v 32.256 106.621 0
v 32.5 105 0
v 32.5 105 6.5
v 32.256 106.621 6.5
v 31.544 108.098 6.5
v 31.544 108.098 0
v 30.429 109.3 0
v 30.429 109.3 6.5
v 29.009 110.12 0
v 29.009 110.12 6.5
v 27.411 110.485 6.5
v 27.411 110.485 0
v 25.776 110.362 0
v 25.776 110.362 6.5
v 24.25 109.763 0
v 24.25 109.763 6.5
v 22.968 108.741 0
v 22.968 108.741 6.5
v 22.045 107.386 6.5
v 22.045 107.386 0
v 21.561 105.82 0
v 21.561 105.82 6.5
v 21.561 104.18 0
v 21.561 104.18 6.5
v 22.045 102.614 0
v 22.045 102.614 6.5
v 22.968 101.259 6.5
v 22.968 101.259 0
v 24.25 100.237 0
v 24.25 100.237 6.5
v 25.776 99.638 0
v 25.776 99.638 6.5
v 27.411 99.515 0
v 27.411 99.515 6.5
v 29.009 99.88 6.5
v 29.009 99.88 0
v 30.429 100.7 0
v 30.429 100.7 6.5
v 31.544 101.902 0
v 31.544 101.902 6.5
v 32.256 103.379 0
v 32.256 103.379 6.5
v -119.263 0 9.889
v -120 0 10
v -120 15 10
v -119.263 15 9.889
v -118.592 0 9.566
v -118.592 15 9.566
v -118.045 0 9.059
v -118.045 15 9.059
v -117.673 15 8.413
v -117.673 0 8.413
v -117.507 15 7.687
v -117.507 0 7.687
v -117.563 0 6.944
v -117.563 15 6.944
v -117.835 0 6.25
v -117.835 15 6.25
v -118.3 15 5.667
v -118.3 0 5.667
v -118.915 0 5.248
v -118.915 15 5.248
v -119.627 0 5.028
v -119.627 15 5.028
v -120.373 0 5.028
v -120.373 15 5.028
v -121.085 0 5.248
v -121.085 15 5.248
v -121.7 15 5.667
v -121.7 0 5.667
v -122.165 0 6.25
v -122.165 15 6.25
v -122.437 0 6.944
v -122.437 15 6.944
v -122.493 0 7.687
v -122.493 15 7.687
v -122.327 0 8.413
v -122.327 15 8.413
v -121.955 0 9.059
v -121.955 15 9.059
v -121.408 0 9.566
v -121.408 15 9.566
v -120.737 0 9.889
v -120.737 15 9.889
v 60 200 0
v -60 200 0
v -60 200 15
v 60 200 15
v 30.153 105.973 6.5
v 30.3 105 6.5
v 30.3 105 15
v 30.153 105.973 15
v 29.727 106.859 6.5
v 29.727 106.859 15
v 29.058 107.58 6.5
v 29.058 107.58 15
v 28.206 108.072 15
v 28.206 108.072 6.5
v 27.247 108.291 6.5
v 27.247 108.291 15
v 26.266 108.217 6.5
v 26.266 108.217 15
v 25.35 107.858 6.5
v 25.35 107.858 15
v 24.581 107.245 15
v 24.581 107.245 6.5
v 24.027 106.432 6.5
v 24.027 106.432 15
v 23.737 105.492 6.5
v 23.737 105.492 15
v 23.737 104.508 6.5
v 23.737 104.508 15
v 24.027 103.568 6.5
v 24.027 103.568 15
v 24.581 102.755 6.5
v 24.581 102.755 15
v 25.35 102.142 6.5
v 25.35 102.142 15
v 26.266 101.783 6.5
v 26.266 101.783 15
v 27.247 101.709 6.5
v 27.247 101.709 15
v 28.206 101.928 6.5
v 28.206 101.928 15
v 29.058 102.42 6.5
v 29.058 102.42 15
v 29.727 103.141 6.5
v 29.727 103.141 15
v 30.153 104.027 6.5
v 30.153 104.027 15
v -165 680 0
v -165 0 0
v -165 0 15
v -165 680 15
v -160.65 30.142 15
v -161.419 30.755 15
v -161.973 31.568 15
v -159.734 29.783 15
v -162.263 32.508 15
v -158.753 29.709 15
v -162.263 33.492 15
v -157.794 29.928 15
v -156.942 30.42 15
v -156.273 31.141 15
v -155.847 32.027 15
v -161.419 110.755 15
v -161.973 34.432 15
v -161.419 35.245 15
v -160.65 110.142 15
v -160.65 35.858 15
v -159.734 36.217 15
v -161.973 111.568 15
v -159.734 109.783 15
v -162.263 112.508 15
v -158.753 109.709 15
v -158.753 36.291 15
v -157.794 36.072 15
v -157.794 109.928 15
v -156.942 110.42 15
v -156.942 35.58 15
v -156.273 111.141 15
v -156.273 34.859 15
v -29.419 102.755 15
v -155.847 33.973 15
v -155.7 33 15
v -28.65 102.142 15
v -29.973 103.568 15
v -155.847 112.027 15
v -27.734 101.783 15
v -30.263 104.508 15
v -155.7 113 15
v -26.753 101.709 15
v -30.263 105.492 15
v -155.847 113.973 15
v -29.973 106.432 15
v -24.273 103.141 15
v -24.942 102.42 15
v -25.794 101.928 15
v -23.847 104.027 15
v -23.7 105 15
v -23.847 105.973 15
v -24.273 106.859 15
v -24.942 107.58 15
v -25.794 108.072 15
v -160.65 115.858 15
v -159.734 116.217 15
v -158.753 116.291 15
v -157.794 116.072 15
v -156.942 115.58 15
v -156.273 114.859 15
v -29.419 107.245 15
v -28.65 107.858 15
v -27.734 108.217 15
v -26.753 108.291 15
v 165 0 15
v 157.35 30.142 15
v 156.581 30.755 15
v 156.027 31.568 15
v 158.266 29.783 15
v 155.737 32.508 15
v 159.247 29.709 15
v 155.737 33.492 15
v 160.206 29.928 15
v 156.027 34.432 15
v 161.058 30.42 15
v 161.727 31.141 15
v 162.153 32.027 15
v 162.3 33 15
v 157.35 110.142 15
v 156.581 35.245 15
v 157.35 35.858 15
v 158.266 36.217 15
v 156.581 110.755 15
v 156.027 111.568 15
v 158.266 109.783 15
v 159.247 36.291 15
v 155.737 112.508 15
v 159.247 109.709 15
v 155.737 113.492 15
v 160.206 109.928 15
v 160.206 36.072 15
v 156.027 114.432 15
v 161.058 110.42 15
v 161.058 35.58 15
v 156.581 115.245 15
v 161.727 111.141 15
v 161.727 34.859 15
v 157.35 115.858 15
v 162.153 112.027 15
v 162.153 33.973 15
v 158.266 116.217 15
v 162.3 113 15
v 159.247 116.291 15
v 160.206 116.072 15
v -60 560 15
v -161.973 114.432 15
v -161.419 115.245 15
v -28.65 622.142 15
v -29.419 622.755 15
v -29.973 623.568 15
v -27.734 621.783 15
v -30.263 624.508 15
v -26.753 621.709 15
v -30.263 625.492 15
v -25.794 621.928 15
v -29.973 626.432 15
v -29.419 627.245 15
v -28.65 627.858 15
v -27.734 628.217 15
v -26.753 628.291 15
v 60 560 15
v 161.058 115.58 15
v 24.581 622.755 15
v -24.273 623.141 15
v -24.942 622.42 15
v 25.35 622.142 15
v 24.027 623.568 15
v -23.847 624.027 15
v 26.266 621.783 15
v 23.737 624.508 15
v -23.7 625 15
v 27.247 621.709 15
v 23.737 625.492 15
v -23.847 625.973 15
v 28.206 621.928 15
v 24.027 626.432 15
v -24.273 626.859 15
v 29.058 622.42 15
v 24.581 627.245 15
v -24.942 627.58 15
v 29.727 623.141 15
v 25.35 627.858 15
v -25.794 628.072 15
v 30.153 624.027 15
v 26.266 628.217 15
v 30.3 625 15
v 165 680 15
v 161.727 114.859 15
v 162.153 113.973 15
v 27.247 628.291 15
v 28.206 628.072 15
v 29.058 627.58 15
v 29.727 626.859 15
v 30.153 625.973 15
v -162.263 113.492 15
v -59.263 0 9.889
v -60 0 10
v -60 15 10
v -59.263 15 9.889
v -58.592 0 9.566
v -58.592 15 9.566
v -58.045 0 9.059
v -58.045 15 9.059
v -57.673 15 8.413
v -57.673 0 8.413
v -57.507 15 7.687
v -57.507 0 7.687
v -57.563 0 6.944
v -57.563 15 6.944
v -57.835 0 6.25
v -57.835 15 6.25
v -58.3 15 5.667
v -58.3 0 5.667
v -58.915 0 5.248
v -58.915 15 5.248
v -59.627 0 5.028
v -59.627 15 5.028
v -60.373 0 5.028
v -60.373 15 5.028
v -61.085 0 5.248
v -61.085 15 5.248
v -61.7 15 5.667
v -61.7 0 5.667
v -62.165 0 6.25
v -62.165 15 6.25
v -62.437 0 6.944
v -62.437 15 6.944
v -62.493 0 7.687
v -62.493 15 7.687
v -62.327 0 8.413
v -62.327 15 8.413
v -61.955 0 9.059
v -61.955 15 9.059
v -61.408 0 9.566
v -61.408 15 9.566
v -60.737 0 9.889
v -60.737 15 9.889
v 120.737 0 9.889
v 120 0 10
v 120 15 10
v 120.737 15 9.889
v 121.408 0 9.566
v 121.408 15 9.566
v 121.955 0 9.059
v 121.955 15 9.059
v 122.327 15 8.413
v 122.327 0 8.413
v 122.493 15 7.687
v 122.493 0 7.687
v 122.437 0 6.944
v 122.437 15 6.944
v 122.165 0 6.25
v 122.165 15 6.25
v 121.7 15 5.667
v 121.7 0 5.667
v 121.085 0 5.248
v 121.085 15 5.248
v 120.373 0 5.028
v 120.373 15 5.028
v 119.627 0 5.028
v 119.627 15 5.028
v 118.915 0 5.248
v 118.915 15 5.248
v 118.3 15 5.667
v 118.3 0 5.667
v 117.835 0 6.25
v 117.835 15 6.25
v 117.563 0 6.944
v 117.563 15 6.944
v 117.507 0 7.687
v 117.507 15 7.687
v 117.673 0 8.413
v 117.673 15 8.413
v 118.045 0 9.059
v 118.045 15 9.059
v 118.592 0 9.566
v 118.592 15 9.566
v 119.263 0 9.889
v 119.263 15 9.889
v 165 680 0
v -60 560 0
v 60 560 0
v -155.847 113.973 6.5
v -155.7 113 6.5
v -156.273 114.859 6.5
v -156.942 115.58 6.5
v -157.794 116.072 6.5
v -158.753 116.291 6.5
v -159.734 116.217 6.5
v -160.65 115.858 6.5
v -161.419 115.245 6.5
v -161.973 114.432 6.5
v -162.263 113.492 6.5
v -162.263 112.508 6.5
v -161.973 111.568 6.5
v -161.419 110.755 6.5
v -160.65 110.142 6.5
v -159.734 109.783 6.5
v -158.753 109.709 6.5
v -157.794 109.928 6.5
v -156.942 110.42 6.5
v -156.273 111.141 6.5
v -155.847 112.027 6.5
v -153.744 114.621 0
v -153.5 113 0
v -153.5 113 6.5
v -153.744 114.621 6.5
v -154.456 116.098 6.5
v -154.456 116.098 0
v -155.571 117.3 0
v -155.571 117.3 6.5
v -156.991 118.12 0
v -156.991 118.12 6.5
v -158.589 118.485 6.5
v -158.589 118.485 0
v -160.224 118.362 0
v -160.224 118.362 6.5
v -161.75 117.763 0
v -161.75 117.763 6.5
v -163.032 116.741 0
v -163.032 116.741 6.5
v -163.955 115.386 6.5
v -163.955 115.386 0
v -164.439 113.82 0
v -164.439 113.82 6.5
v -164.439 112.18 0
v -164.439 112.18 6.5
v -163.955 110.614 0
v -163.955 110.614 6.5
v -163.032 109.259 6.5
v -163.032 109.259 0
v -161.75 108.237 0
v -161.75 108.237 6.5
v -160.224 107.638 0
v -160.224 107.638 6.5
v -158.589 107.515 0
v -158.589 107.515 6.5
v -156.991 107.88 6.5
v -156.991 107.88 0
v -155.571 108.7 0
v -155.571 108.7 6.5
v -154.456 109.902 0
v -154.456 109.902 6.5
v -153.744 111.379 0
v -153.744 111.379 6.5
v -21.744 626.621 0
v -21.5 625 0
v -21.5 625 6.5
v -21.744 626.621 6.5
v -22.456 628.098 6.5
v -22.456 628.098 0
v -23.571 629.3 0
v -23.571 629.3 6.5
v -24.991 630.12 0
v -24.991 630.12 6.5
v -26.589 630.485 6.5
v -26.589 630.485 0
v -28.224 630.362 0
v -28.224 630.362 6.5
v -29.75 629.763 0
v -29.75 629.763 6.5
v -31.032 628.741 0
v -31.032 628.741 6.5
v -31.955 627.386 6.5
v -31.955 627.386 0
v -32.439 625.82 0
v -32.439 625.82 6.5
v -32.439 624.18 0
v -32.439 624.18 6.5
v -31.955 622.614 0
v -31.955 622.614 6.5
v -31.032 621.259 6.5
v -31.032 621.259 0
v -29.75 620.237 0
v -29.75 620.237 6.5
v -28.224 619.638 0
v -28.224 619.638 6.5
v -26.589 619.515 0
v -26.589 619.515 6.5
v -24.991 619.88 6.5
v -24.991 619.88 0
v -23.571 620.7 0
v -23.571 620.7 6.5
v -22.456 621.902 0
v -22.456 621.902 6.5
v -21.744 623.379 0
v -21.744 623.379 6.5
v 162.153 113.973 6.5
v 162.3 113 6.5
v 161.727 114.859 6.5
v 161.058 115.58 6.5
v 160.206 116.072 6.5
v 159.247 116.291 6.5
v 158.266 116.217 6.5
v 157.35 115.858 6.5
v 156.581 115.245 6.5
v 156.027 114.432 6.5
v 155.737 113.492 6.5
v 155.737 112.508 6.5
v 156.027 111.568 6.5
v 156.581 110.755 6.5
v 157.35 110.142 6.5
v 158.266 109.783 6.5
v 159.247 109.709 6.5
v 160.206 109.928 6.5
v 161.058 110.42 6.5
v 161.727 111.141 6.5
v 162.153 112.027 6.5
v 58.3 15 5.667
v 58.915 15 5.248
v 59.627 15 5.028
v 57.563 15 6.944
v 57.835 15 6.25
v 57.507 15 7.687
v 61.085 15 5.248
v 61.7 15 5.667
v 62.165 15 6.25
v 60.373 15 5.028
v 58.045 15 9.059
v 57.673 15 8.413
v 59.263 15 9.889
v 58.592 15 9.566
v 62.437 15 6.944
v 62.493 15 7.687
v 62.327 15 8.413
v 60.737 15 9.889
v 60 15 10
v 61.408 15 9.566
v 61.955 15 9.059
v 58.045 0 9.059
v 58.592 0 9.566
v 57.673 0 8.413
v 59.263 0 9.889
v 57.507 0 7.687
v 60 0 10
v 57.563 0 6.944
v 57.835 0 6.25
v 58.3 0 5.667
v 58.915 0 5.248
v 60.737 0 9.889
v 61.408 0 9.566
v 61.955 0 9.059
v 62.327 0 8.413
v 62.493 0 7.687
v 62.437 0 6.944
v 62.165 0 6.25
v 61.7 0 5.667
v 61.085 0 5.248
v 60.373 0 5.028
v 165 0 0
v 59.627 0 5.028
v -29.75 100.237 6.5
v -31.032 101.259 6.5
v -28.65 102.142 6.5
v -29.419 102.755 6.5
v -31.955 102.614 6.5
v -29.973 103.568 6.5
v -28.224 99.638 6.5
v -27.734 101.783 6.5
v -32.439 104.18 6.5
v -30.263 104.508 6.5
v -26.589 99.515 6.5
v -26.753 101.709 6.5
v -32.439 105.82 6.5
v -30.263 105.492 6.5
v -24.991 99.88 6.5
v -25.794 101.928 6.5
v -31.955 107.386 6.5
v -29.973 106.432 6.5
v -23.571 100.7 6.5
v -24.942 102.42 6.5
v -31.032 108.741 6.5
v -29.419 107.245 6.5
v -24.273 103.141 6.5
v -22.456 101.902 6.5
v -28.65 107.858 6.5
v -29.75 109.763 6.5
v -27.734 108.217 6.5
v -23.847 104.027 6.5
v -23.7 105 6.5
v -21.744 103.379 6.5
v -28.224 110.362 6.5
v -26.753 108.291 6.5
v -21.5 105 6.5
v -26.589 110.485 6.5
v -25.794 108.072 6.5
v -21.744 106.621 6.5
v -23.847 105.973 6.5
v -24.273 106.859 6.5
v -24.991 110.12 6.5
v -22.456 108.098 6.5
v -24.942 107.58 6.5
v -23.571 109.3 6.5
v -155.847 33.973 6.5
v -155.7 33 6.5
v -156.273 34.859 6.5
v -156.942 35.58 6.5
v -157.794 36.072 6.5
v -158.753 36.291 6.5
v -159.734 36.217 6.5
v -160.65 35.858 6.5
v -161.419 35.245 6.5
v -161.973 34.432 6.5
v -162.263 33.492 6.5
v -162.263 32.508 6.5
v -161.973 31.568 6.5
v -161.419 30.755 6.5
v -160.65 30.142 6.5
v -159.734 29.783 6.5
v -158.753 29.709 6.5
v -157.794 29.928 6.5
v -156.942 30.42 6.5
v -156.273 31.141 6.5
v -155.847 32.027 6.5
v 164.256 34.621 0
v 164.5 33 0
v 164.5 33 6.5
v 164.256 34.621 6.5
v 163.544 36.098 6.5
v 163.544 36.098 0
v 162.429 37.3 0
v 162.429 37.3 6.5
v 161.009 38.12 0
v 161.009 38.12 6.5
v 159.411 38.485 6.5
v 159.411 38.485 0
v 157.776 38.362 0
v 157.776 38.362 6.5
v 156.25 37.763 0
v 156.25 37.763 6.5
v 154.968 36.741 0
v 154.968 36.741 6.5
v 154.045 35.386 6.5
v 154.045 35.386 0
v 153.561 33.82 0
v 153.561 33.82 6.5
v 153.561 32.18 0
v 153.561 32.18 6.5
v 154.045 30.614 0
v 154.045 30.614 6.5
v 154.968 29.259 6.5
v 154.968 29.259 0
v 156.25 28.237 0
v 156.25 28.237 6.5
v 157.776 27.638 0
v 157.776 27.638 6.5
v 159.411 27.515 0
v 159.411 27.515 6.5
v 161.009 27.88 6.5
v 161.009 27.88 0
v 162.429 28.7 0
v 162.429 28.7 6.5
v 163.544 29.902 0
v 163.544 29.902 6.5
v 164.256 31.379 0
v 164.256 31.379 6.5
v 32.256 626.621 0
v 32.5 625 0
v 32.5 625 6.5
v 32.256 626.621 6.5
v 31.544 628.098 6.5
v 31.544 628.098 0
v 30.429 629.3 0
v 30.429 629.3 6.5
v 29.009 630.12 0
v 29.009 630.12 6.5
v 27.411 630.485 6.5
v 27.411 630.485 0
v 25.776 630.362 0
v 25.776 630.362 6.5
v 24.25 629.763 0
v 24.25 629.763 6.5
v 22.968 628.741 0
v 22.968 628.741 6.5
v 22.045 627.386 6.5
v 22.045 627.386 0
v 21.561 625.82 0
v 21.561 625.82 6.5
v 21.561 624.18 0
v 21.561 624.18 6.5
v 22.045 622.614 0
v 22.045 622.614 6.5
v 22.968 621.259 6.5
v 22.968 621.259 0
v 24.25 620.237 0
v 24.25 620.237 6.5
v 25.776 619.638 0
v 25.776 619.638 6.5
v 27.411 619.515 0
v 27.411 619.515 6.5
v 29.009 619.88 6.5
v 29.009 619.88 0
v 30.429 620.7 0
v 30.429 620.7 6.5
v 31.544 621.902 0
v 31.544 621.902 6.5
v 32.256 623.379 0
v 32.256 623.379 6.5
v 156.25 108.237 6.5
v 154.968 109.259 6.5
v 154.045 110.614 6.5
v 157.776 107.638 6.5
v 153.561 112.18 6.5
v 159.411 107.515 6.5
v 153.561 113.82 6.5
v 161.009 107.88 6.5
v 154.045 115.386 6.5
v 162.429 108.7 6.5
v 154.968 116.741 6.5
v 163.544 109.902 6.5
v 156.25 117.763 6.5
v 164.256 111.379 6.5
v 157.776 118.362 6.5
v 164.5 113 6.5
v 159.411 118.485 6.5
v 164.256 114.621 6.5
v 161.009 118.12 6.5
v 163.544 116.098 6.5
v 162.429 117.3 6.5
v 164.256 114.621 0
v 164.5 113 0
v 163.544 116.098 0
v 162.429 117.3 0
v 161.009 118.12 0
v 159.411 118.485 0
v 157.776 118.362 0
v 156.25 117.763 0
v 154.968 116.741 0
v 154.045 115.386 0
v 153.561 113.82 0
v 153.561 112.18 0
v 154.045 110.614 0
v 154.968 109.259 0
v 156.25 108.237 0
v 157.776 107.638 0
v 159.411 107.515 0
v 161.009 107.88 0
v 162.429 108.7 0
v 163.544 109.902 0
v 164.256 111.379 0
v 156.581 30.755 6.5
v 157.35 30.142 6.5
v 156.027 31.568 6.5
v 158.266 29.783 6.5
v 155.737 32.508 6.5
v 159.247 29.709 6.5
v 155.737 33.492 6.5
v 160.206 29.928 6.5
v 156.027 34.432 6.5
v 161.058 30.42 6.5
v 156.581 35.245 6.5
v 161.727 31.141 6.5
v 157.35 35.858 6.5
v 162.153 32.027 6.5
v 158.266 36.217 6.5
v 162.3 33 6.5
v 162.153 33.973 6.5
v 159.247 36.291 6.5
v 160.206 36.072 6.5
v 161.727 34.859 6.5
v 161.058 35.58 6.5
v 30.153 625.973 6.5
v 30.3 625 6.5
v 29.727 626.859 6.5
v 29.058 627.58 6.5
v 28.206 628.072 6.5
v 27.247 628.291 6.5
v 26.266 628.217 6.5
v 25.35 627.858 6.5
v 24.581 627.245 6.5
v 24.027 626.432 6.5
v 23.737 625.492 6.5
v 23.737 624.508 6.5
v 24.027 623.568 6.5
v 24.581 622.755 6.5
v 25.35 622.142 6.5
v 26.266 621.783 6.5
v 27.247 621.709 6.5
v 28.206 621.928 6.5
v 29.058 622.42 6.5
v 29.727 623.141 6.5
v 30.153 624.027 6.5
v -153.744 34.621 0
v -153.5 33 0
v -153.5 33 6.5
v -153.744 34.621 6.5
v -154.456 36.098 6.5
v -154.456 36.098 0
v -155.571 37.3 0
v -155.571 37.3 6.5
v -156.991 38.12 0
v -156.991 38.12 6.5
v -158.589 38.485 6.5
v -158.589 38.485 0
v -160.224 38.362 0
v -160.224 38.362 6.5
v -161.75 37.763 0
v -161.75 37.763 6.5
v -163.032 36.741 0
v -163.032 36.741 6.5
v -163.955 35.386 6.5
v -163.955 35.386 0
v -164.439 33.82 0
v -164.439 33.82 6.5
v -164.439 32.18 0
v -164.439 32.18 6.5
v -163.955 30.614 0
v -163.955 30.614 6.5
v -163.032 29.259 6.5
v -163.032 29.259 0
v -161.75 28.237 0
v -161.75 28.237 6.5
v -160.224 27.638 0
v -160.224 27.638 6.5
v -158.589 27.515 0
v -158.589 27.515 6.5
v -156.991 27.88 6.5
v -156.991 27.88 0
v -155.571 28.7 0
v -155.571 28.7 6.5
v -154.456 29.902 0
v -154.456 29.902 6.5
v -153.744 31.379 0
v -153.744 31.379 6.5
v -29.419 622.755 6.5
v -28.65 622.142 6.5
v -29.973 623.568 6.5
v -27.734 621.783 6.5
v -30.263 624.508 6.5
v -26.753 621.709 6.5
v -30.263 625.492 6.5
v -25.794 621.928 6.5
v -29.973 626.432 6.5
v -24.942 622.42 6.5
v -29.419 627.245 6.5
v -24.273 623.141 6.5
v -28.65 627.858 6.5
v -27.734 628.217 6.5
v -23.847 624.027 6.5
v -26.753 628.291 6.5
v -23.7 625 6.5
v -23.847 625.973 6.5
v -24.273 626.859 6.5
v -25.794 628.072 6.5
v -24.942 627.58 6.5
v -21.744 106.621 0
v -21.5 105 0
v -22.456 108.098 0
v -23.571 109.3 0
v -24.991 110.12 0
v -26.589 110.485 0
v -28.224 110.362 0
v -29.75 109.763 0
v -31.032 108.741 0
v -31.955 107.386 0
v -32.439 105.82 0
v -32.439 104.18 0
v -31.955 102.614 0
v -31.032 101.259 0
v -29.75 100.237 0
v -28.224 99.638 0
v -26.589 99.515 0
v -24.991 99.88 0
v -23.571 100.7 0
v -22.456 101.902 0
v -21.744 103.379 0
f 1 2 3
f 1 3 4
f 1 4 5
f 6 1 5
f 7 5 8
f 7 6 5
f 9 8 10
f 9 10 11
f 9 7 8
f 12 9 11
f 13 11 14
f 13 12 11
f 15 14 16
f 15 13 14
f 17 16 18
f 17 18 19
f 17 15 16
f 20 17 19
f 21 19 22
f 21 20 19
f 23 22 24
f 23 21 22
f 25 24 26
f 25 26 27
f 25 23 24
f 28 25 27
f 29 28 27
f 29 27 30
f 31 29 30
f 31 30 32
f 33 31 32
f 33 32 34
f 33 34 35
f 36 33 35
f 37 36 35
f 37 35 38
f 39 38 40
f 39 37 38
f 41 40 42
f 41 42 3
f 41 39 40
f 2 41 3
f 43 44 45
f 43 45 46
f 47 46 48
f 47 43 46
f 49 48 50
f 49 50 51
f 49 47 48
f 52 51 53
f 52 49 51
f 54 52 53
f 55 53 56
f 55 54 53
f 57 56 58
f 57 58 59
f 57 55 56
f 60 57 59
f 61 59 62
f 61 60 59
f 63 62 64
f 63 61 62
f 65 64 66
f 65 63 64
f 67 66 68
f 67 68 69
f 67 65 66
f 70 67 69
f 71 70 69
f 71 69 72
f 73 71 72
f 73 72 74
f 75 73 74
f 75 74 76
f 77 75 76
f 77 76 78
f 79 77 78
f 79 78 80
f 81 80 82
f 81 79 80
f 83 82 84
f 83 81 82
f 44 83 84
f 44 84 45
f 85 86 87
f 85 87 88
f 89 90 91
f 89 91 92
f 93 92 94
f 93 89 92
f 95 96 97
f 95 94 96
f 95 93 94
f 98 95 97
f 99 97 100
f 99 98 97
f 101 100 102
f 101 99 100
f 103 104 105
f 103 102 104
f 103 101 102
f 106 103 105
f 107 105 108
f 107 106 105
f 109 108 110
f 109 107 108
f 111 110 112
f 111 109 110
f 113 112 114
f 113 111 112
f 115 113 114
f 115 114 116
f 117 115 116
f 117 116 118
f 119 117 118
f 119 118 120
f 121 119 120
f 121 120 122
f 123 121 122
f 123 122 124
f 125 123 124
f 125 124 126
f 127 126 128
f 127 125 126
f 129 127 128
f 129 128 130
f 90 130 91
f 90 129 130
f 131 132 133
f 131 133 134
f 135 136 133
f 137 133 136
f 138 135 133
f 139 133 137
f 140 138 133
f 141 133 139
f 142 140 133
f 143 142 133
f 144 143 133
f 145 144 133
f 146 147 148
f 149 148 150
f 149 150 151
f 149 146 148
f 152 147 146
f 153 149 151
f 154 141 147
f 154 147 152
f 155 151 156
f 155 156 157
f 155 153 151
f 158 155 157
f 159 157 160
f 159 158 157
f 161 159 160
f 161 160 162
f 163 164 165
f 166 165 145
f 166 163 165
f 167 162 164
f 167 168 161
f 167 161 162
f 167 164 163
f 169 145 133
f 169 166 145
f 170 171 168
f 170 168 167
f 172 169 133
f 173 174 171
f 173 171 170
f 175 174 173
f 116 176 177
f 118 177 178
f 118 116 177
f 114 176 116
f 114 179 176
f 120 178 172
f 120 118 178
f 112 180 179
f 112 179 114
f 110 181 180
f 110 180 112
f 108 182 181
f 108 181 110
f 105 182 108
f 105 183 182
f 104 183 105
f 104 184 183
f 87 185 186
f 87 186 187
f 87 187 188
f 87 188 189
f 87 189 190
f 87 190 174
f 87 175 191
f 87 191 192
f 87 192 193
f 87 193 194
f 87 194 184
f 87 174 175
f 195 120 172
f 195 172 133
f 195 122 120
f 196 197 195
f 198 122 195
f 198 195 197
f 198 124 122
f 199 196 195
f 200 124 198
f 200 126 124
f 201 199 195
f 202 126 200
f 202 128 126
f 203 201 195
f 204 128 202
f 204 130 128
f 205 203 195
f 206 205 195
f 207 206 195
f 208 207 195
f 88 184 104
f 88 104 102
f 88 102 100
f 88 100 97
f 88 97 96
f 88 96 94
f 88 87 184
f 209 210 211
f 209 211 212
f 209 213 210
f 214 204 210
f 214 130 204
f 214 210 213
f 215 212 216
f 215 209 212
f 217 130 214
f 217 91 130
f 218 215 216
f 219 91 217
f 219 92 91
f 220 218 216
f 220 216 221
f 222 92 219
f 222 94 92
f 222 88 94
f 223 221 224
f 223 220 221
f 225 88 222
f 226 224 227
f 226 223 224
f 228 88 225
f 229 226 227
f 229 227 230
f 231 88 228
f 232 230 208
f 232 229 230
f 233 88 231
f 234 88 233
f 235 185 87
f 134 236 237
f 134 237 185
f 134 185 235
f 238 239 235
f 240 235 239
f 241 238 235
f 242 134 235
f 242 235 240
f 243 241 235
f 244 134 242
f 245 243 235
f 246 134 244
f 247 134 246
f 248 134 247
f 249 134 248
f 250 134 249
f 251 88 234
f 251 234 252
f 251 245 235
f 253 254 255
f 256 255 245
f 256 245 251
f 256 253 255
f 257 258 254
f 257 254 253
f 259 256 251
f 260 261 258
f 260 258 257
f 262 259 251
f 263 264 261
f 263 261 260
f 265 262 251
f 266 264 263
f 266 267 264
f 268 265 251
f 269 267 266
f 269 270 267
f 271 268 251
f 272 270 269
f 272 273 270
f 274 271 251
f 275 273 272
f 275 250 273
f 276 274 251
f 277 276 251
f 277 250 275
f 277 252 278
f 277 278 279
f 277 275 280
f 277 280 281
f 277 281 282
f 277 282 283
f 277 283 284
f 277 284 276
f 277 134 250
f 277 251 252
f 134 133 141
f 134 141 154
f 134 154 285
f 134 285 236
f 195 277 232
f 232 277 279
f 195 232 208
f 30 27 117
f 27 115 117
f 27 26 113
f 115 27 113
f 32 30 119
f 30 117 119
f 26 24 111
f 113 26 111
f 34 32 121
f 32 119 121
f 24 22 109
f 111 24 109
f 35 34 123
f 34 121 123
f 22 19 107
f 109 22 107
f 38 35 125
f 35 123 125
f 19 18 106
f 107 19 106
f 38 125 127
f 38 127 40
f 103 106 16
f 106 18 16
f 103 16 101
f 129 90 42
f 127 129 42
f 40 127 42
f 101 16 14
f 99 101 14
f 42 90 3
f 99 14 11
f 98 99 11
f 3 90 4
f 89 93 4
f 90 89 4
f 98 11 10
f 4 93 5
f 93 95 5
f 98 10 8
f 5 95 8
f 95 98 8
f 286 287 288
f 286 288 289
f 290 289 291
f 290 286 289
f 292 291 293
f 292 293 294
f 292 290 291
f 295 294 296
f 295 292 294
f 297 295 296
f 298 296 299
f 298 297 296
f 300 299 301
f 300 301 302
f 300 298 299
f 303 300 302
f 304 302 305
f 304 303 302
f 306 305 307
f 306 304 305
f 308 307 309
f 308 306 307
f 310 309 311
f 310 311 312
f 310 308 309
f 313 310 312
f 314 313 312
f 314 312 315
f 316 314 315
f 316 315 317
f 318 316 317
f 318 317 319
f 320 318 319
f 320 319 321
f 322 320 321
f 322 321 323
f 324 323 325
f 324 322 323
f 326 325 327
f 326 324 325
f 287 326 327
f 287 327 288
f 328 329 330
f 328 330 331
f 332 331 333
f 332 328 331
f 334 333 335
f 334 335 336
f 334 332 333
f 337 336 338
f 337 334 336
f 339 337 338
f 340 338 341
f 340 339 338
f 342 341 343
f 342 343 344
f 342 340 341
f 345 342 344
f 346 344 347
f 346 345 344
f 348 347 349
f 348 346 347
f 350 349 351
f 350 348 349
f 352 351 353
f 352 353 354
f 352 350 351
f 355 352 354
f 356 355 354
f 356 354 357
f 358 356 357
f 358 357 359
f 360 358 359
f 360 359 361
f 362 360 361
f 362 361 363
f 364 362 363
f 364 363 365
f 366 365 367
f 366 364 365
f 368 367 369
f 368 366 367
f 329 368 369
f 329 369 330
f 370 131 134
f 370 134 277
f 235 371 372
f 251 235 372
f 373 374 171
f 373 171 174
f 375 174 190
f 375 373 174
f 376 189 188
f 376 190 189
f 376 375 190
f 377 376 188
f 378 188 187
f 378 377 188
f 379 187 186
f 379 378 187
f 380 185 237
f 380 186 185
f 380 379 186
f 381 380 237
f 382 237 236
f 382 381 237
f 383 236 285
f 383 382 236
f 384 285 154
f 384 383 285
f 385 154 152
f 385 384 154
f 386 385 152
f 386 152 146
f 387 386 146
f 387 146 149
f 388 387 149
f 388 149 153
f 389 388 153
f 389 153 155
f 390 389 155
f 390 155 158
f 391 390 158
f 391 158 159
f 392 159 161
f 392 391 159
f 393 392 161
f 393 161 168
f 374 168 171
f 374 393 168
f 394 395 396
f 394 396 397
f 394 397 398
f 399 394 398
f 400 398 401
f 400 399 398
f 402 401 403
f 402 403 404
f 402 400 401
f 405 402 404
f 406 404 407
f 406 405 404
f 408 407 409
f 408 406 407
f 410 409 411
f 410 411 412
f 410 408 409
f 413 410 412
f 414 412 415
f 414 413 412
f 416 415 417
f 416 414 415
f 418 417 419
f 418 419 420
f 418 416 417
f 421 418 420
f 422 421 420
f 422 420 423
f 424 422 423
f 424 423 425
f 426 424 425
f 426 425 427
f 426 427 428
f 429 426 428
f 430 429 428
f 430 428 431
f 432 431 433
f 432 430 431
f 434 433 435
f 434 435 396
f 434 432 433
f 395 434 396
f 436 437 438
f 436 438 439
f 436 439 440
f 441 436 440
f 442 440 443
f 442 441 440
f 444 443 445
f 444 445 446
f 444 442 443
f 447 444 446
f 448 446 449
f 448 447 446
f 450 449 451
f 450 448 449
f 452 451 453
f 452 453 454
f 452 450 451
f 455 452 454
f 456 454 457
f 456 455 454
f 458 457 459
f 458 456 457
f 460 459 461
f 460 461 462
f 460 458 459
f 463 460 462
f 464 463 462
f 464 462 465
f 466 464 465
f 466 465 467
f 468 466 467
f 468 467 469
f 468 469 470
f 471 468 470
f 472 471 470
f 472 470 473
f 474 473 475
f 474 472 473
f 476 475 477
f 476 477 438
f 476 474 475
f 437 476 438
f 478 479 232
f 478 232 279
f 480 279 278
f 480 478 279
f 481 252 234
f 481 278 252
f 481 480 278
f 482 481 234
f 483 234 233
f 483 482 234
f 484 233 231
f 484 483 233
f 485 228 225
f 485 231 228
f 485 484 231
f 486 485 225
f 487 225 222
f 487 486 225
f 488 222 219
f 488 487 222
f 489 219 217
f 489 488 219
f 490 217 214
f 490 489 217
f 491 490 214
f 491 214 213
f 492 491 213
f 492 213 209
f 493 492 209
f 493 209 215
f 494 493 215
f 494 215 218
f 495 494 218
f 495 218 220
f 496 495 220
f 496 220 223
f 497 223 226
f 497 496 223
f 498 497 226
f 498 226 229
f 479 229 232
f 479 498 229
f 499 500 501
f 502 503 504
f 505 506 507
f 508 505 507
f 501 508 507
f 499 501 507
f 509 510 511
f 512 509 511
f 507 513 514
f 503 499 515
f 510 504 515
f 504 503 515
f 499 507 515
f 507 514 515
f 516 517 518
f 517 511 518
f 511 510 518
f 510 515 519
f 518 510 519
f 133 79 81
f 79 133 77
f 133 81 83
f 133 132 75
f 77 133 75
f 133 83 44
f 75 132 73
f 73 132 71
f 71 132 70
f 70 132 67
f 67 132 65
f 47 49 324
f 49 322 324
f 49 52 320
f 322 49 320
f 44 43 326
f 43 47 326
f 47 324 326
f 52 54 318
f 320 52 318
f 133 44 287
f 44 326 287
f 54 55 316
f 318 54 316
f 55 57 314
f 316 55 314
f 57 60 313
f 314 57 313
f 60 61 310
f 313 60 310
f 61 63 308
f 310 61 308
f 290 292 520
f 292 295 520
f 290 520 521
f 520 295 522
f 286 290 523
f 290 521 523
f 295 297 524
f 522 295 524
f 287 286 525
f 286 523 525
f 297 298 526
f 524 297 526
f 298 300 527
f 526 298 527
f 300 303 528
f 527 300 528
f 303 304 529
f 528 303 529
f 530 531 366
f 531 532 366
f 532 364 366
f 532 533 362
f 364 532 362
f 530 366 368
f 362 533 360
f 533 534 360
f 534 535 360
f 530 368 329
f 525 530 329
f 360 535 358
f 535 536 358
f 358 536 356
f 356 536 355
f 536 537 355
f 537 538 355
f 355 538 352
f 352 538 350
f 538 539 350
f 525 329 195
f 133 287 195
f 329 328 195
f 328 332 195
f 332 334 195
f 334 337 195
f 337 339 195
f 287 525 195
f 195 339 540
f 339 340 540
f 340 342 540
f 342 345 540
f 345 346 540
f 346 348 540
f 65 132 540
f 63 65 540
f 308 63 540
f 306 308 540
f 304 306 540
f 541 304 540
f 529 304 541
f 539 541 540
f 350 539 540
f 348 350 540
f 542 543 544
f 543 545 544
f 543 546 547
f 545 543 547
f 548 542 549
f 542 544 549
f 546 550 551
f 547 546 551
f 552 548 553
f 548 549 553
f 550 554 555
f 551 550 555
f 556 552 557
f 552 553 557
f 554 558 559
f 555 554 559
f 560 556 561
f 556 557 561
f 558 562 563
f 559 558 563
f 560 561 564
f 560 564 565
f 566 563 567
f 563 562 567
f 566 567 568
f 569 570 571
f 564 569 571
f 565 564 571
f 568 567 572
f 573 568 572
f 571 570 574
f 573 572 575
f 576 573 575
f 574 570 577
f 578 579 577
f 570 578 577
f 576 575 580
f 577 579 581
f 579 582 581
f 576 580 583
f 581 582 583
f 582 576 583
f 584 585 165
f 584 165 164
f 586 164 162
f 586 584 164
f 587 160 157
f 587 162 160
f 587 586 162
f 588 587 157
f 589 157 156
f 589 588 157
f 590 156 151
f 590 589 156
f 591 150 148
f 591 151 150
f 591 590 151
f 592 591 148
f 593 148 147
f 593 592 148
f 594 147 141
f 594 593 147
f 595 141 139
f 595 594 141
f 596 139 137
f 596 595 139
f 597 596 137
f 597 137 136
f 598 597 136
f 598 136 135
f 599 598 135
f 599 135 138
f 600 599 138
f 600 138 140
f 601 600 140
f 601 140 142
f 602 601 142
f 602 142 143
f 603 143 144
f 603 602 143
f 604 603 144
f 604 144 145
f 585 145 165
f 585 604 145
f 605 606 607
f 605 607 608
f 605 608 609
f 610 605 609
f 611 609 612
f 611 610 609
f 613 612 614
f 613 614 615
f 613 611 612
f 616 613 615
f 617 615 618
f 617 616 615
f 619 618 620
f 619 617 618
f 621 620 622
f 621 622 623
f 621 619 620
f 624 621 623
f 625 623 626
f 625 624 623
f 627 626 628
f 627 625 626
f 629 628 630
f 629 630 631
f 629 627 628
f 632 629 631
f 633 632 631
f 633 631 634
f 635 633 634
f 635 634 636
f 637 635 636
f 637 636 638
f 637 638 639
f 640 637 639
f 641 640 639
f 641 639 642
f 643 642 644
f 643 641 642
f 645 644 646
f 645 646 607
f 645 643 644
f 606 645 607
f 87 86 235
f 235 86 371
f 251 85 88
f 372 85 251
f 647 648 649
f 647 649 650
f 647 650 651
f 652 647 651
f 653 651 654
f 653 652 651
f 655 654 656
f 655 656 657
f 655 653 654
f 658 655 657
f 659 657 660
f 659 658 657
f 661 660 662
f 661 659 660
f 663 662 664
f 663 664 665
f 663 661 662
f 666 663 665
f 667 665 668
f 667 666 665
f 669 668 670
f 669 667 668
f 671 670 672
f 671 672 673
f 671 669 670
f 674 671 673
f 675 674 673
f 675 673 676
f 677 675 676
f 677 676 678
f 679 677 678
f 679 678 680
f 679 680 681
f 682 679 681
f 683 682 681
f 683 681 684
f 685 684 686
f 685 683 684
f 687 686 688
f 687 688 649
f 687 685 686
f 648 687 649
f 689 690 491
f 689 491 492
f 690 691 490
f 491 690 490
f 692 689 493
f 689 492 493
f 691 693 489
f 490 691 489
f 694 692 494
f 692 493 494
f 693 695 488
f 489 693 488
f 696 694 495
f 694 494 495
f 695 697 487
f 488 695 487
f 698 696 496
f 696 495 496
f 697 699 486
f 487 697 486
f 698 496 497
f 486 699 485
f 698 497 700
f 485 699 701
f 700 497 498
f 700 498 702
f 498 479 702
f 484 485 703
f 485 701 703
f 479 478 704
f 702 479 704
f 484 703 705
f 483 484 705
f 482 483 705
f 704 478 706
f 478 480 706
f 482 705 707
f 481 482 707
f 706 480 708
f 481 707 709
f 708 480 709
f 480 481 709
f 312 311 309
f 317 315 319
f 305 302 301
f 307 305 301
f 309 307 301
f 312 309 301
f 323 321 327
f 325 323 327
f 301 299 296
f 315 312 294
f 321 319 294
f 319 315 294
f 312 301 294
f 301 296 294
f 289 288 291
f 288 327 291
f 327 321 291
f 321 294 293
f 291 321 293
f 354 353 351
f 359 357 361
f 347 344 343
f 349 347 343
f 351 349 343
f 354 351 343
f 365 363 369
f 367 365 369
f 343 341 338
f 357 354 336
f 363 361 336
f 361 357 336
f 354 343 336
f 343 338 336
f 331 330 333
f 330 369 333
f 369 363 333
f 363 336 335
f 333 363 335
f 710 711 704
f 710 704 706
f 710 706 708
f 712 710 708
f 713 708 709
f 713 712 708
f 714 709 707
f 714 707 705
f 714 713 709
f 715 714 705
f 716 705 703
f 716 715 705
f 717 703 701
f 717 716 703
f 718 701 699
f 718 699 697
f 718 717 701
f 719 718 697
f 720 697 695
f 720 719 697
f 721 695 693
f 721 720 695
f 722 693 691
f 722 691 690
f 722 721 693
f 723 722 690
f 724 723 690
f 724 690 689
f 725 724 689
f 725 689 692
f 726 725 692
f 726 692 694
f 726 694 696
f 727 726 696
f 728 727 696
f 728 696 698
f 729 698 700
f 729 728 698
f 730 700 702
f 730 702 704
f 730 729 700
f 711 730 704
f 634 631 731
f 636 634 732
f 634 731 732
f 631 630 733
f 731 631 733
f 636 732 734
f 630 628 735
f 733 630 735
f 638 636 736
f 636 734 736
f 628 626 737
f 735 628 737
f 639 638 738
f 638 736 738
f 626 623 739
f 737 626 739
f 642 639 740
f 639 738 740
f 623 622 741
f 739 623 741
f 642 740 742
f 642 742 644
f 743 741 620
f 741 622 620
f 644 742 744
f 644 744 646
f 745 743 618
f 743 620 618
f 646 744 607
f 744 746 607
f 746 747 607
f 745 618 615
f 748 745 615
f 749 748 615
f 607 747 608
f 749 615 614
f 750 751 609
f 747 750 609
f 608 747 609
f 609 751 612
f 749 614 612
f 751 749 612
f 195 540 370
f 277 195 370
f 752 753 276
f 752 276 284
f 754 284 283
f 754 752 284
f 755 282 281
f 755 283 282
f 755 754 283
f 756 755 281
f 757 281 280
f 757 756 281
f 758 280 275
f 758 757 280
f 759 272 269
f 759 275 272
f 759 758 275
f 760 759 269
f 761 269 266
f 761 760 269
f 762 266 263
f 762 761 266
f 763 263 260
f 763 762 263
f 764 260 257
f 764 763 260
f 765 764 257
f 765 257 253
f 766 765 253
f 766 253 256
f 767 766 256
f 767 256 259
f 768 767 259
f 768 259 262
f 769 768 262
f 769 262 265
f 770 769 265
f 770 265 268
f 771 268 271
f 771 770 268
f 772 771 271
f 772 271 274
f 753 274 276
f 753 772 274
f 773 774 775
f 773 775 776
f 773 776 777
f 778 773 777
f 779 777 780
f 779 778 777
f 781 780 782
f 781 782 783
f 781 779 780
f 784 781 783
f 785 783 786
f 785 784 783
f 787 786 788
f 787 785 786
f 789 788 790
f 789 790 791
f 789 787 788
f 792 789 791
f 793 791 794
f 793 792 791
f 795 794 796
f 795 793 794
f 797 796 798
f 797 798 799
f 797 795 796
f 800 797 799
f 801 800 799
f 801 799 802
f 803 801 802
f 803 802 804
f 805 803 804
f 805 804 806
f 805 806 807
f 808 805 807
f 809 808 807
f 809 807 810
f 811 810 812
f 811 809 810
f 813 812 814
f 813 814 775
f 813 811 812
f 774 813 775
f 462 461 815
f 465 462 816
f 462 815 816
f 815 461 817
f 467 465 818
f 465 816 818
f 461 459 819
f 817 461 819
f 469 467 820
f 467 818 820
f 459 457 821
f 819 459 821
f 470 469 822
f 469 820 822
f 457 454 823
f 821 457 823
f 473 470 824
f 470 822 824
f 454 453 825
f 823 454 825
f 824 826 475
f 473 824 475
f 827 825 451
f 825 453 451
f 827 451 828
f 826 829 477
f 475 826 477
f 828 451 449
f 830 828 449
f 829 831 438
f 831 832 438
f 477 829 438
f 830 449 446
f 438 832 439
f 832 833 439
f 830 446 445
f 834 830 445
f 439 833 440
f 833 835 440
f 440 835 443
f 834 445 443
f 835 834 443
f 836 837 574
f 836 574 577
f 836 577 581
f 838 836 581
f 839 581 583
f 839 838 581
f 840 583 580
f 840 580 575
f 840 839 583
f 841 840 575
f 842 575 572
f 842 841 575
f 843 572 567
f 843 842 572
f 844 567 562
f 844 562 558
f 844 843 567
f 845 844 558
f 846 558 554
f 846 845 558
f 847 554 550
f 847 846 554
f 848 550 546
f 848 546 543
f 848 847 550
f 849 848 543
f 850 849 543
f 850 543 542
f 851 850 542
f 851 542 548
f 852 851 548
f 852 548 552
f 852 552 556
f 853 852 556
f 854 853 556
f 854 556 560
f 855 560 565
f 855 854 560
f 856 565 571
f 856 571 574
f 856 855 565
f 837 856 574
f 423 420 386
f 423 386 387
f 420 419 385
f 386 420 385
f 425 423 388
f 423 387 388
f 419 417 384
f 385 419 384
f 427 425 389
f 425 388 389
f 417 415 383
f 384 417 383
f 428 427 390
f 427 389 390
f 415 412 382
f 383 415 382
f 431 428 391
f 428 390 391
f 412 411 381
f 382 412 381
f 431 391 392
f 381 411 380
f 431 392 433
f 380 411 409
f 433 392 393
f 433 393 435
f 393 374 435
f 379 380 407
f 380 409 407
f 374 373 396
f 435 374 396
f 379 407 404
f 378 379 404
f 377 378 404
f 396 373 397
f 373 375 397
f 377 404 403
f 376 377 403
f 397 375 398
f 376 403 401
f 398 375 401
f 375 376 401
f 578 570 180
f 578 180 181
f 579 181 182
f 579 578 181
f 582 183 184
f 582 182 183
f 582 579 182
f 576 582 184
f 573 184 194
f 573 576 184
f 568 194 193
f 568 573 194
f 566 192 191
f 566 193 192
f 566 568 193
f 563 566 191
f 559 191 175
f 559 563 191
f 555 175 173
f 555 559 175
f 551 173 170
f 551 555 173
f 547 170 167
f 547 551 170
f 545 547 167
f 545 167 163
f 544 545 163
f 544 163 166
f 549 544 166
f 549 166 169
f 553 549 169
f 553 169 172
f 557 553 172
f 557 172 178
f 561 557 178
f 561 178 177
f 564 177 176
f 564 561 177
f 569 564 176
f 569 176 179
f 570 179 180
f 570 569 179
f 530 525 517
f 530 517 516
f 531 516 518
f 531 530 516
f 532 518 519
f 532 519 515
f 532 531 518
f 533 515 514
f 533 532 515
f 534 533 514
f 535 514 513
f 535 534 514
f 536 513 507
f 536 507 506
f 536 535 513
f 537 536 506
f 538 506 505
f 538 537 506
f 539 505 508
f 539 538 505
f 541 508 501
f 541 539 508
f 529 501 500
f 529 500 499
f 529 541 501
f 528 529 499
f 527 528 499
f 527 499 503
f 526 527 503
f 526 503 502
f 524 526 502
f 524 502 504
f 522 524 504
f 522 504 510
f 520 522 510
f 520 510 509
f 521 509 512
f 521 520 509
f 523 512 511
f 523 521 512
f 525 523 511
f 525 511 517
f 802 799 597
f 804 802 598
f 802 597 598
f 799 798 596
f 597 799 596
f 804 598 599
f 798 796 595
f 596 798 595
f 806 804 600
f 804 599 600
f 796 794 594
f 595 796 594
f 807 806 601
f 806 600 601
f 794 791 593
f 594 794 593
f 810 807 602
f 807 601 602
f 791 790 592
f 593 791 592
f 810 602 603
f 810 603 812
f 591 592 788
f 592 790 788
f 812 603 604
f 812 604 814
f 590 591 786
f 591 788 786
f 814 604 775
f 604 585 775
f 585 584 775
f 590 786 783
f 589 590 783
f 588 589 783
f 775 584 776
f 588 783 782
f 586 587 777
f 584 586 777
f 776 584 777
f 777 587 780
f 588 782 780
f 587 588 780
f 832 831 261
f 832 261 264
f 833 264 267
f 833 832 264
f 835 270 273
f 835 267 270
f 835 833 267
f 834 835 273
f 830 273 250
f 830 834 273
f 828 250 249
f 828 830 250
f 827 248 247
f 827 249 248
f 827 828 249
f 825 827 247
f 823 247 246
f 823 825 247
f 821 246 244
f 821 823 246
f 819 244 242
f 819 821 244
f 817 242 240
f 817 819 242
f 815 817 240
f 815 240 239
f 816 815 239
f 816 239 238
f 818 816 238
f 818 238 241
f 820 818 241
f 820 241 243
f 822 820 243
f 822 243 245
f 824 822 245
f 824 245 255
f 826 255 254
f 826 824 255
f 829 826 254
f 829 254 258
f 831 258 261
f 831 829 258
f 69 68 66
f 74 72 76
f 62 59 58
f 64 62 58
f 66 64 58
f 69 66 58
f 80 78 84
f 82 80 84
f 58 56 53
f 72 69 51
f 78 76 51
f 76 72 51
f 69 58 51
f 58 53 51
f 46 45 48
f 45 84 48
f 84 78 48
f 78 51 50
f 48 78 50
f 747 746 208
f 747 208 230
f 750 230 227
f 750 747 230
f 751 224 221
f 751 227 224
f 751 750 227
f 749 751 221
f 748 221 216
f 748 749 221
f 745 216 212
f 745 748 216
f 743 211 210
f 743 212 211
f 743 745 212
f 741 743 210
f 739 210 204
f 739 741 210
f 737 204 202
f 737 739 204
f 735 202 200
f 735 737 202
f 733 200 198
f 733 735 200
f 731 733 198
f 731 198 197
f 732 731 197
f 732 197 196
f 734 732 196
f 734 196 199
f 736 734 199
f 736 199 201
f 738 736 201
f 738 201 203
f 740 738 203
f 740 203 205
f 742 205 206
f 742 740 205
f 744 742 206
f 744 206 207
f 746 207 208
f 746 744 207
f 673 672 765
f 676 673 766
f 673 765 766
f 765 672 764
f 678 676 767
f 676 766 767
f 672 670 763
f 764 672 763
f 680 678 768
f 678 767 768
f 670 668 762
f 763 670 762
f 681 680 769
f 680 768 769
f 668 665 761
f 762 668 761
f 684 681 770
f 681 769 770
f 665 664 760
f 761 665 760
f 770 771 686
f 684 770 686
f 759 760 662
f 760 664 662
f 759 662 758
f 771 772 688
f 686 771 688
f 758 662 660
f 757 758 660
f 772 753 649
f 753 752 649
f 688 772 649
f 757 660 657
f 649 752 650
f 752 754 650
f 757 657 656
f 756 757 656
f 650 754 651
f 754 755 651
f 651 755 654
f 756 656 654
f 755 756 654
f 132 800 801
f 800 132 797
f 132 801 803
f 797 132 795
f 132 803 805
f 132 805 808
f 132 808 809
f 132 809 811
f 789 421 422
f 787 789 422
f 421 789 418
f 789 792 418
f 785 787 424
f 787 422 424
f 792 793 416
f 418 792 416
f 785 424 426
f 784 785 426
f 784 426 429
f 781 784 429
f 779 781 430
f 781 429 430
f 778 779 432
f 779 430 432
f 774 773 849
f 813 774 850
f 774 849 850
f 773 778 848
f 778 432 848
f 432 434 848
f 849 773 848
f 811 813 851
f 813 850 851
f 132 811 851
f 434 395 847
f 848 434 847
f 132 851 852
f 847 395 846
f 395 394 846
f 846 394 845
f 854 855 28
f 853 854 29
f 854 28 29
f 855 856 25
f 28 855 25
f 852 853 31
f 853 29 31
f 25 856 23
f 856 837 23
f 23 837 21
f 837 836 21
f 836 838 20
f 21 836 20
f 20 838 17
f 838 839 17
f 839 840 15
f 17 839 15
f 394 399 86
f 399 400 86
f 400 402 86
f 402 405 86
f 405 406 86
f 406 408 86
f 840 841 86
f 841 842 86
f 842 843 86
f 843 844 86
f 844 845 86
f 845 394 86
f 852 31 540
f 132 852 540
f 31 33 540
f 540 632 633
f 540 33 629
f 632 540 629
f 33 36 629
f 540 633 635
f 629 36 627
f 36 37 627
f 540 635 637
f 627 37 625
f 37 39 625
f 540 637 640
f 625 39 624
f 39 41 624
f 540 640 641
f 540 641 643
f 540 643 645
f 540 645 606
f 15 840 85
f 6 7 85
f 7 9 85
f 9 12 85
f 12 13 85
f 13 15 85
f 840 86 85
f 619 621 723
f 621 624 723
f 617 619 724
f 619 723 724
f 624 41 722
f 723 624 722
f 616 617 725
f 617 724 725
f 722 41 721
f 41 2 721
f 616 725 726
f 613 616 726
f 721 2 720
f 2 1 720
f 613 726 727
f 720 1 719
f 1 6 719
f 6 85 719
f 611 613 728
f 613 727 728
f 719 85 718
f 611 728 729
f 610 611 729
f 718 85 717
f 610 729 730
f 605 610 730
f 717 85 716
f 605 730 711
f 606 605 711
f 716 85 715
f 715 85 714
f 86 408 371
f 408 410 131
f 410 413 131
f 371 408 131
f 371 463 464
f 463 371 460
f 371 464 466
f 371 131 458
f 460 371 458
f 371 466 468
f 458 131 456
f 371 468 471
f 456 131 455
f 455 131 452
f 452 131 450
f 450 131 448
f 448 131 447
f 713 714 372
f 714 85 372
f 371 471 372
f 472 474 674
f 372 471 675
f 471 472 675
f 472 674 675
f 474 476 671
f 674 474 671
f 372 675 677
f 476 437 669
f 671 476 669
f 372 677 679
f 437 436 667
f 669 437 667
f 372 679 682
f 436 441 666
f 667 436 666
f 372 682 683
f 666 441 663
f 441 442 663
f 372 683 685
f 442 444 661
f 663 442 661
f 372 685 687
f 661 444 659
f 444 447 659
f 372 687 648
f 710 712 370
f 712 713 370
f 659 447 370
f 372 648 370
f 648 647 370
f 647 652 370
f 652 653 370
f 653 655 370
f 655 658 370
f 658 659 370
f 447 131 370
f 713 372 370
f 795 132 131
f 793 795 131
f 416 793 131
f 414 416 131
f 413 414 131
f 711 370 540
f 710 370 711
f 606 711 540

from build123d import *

# Parameters (mm, degrees)
SKETCH1_W               = 330
SKETCH1_H               = 680
BOSS_EXTRUDE1_DEPTH     = 15
CUT_EXTRUDE1_DEPTH      = 700.892848942
CUT_EXTRUDE1_DEPTH_BACK = 700.892848942
SKETCH2_R               = 3.3
SKETCH3_R               = 5.5
CUT_EXTRUDE3_DEPTH      = 6.5
CUT_EXTRUDE4_DEPTH      = 700.892848942
CUT_EXTRUDE4_DEPTH_BACK = 700.892848942
SKETCH4_R               = 3.3
SKETCH5_R               = 5.5
CUT_EXTRUDE6_DEPTH      = 6.5
SKETCH6_R               = 2.5
CUT_EXTRUDE8_DEPTH      = 15
CUT_EXTRUDE9_DEPTH      = 700.892848942
CUT_EXTRUDE9_DEPTH_BACK = 700.892848942
SKETCH7_W               = 120
SKETCH7_H               = 360


with BuildPart() as part:
    # Sketch1 → Boss-Extrude1 (new body)
    with BuildSketch(Plane.XY):
        with Locations((0, 340)):
            Rectangle(SKETCH1_W, SKETCH1_H)
    extrude(amount=BOSS_EXTRUDE1_DEPTH)

    # Sketch2 → Cut-Extrude1 (cut, two sides: drawn at the far end of the back side and taken through both)
    with BuildSketch(Plane.XY.offset(-CUT_EXTRUDE1_DEPTH_BACK)):
        with Locations((-27, 105)):
            Circle(SKETCH2_R)
        with Locations((-27, 625)):
            Circle(SKETCH2_R)
        with Locations((27, 105)):
            Circle(SKETCH2_R)
        with Locations((27, 625)):
            Circle(SKETCH2_R)
    extrude(amount=CUT_EXTRUDE1_DEPTH + CUT_EXTRUDE1_DEPTH_BACK, mode=Mode.SUBTRACT)

    # Sketch3 → Cut-Extrude3 (cut)
    with BuildSketch(Plane.XY):
        with Locations((-27, 105)):
            Circle(SKETCH3_R)
        with Locations((-27, 625)):
            Circle(SKETCH3_R)
        with Locations((27, 105)):
            Circle(SKETCH3_R)
        with Locations((27, 625)):
            Circle(SKETCH3_R)
    extrude(amount=CUT_EXTRUDE3_DEPTH, mode=Mode.SUBTRACT)

    # Sketch4 → Cut-Extrude4 (cut, two sides: drawn at the far end of the back side and taken through both)
    with BuildSketch(Plane.XY.offset(-CUT_EXTRUDE4_DEPTH_BACK)):
        with Locations((-159, 33)):
            Circle(SKETCH4_R)
        with Locations((-159, 113)):
            Circle(SKETCH4_R)
        with Locations((159, 33)):
            Circle(SKETCH4_R)
        with Locations((159, 113)):
            Circle(SKETCH4_R)
    extrude(amount=CUT_EXTRUDE4_DEPTH + CUT_EXTRUDE4_DEPTH_BACK, mode=Mode.SUBTRACT)

    # Sketch5 → Cut-Extrude6 (cut)
    with BuildSketch(Plane.XY):
        with Locations((-159, 33)):
            Circle(SKETCH5_R)
        with Locations((-159, 113)):
            Circle(SKETCH5_R)
        with Locations((159, 33)):
            Circle(SKETCH5_R)
        with Locations((159, 113)):
            Circle(SKETCH5_R)
    extrude(amount=CUT_EXTRUDE6_DEPTH, mode=Mode.SUBTRACT)

    # Sketch6 → Cut-Extrude8 (cut)
    with BuildSketch(Plane(origin=(0, 0, 0), x_dir=(1, 0, 0), z_dir=(0, 1, 0))):
        with Locations(Location((-120, -7.5, 0), (0, 0, 270))):
            Circle(SKETCH6_R)
        with Locations(Location((-60, -7.5, 0), (0, 0, 270))):
            Circle(SKETCH6_R)
        with Locations(Location((60, -7.5, 0), (0, 0, 270))):
            Circle(SKETCH6_R)
        with Locations(Location((120, -7.5, 0), (0, 0, 270))):
            Circle(SKETCH6_R)
    extrude(amount=CUT_EXTRUDE8_DEPTH, mode=Mode.SUBTRACT)

    # Sketch7 → Cut-Extrude9 (cut, two sides: drawn at the far end of the back side and taken through both)
    with BuildSketch(Plane.XY.offset(-CUT_EXTRUDE9_DEPTH_BACK)):
        with Locations((0, 380)):
            Rectangle(SKETCH7_W, SKETCH7_H)
    extrude(amount=CUT_EXTRUDE9_DEPTH + CUT_EXTRUDE9_DEPTH_BACK, mode=Mode.SUBTRACT)


solid = part.part
